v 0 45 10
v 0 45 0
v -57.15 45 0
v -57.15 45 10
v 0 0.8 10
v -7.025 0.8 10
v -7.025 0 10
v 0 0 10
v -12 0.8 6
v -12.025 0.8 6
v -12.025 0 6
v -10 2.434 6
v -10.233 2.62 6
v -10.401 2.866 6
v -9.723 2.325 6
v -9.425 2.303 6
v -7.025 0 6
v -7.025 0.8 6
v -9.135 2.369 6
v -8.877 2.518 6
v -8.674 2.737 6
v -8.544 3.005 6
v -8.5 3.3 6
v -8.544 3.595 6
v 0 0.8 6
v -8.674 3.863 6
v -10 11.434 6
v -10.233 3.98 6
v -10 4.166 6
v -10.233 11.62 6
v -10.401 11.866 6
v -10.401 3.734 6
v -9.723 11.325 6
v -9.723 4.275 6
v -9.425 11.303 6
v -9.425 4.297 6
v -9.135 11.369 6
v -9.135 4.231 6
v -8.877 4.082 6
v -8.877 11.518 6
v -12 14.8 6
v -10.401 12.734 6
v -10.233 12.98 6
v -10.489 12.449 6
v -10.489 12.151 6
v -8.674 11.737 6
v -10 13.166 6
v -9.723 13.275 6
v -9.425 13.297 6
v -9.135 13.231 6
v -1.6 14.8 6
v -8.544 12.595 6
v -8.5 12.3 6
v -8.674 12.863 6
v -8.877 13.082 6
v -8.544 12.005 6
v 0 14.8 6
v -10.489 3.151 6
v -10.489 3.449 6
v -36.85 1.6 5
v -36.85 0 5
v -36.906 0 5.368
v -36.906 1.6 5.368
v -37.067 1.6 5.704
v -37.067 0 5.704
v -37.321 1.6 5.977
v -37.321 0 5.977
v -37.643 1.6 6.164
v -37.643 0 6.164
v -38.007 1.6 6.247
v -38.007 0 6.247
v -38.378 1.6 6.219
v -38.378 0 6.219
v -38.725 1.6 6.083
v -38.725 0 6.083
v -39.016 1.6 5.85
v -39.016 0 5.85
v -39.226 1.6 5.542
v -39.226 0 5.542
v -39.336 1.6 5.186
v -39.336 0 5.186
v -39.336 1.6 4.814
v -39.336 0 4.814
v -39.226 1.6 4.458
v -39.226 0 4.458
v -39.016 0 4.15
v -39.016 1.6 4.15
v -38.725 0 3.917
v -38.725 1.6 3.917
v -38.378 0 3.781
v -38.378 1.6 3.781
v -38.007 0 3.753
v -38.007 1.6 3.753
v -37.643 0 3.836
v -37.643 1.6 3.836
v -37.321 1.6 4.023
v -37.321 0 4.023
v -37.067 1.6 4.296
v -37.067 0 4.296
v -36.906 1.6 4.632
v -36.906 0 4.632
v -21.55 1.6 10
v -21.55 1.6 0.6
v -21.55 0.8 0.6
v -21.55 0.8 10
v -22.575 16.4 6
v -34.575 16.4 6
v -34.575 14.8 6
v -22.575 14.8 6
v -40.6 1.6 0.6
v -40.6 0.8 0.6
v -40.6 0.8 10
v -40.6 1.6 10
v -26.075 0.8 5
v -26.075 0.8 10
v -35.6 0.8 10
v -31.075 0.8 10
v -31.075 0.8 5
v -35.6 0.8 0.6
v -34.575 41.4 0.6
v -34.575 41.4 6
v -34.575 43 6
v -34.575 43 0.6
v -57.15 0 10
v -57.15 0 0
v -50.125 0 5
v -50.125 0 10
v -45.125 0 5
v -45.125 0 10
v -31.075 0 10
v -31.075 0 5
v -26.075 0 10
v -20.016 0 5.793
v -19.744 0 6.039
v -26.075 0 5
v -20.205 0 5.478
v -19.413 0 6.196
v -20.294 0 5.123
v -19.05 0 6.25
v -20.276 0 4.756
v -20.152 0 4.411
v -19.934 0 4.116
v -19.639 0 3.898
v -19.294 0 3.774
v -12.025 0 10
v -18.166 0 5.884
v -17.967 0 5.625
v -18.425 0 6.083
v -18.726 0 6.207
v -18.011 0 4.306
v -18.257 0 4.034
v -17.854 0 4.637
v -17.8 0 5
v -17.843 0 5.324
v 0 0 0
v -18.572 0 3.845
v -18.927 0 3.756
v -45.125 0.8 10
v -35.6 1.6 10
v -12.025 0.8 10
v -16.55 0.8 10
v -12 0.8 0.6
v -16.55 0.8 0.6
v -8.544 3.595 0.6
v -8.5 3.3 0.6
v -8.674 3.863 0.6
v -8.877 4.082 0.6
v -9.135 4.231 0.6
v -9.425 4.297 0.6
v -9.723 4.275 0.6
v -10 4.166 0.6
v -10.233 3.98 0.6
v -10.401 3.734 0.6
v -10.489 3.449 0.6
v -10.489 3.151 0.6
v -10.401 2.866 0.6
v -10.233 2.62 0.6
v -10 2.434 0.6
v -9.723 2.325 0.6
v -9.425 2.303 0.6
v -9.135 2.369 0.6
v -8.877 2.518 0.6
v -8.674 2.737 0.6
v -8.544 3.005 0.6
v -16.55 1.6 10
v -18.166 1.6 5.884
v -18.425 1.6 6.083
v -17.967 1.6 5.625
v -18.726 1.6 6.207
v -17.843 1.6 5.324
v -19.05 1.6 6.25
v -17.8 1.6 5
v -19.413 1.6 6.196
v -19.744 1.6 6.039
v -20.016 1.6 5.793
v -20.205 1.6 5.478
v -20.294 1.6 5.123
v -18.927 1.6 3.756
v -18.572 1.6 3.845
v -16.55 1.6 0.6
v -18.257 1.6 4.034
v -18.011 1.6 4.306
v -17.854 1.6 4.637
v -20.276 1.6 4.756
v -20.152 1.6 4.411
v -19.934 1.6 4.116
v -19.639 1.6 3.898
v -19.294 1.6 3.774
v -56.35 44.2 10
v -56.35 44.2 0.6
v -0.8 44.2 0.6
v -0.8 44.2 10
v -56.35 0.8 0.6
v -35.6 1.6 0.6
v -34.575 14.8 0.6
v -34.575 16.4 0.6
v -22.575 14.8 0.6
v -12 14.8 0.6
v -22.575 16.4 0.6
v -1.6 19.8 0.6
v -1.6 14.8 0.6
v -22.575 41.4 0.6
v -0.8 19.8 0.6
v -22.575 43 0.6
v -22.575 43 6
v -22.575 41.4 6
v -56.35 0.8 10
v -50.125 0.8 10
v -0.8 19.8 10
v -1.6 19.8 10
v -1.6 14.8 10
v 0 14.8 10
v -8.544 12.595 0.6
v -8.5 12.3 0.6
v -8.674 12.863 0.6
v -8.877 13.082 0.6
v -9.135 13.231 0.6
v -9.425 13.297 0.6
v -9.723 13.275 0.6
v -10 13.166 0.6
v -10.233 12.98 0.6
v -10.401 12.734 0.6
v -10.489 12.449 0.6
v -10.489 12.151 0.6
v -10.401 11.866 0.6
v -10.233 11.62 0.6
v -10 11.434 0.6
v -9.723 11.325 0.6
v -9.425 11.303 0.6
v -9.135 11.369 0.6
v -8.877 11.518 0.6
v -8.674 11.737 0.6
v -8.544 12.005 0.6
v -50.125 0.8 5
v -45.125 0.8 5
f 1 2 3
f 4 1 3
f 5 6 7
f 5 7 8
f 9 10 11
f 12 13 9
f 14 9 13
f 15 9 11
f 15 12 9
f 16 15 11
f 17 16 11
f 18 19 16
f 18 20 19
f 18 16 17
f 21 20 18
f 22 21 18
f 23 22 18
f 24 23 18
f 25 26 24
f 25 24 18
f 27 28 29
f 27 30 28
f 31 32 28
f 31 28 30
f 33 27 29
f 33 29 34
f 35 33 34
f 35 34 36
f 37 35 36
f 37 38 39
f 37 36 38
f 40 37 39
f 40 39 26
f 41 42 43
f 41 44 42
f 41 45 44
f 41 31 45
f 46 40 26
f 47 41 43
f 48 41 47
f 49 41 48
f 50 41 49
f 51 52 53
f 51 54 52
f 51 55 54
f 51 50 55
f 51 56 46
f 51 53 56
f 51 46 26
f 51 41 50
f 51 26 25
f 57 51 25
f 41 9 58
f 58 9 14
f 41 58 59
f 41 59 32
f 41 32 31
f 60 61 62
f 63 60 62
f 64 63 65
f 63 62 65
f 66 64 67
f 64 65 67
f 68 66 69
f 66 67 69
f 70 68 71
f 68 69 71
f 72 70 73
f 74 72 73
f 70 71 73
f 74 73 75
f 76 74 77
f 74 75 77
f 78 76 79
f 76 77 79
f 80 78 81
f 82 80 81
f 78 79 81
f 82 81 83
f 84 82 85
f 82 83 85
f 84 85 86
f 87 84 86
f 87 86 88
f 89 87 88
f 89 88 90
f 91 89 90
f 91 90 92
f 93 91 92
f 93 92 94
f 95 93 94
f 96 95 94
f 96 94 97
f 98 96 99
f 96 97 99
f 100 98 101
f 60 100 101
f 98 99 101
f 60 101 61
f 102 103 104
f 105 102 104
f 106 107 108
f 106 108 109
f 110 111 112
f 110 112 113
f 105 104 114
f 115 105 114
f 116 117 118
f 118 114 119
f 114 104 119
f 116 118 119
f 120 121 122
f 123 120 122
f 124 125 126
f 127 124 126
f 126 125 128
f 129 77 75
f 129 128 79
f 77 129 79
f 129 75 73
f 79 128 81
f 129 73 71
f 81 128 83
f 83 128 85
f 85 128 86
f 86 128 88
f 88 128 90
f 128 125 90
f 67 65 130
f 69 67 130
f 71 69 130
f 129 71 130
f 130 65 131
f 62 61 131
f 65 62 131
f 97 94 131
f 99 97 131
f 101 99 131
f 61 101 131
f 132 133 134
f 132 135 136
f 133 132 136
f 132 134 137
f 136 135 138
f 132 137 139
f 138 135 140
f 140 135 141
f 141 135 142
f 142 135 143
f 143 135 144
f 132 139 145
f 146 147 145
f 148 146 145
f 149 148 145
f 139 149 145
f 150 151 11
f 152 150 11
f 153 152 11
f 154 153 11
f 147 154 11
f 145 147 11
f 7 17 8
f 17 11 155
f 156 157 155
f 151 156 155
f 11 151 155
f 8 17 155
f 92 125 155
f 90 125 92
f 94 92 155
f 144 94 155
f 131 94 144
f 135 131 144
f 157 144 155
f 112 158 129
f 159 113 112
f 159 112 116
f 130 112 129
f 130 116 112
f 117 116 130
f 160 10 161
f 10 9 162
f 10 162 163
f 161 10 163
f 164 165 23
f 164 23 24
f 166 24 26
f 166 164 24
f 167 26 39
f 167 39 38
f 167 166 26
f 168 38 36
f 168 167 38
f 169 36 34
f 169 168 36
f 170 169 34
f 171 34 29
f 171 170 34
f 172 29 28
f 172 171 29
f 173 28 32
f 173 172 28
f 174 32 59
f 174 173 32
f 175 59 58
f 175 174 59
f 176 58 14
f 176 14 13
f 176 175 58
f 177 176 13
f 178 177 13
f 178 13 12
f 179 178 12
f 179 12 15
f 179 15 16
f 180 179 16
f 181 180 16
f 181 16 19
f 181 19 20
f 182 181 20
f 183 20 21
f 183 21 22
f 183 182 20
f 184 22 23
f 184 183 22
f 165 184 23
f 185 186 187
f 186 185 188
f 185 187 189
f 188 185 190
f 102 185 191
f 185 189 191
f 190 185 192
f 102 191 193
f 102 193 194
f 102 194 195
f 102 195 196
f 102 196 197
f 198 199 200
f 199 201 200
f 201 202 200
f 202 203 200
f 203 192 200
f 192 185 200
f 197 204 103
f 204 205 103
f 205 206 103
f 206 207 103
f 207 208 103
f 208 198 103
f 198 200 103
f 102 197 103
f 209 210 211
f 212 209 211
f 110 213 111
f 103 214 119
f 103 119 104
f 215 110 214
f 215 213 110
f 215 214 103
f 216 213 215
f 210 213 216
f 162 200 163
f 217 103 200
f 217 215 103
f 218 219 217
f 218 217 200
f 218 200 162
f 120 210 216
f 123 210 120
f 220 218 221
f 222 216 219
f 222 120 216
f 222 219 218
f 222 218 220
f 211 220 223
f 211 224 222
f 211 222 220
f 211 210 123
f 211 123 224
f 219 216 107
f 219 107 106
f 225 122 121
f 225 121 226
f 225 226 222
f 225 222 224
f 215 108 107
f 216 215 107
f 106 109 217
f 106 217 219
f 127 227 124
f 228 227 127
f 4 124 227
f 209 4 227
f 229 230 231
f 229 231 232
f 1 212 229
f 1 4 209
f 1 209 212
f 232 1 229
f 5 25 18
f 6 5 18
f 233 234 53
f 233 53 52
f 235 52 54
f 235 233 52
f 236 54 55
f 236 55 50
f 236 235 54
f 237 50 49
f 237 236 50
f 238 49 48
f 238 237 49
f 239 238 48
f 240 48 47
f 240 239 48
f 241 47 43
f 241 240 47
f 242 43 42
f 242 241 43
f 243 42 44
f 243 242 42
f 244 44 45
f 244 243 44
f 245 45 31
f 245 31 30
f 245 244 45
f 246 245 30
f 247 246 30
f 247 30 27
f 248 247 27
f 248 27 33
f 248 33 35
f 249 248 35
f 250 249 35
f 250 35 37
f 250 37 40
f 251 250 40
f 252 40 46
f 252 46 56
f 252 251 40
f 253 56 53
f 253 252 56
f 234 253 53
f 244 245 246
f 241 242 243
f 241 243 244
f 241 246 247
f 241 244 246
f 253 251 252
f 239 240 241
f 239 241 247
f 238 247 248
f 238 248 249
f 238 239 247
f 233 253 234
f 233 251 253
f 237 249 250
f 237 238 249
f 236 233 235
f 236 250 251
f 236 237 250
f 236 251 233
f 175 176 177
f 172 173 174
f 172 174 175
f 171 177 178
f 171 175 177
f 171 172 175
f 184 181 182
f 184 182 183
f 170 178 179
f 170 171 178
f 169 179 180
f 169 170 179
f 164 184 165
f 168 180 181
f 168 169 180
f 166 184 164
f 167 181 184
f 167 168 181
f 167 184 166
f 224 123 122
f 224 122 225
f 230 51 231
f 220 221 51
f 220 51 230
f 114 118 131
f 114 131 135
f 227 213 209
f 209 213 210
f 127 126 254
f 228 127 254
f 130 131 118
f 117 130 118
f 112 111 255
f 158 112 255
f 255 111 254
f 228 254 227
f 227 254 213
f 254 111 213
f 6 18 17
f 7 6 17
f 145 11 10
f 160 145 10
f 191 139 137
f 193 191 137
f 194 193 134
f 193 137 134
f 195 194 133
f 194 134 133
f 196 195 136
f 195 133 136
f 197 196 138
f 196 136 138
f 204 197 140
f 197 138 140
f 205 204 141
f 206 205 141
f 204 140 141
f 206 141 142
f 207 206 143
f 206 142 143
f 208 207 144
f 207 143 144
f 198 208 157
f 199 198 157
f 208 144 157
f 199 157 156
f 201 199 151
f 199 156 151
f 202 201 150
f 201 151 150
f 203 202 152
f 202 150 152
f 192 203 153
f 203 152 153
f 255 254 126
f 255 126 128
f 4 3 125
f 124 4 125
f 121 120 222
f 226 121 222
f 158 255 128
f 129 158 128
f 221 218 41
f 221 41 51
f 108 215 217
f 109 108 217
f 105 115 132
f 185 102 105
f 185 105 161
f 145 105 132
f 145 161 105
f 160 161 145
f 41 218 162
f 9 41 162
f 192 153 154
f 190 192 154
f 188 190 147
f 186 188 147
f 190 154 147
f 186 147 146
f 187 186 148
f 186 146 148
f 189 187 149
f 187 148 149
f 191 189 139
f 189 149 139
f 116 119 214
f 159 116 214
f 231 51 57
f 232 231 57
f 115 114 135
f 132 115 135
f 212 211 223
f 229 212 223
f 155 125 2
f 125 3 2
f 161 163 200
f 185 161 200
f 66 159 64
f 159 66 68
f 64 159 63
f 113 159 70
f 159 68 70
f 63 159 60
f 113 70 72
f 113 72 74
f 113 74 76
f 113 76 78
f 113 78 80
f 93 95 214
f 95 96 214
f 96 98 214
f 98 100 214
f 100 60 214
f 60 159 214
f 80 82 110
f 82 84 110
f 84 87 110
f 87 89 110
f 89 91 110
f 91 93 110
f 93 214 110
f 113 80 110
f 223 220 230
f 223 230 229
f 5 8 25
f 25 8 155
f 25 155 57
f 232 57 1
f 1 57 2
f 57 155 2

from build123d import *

# Parameters (mm, degrees)
F0_W     = 12
F0_H     = 1.6
F0_H_2   = 7
F0_R     = 1
F1_DEPTH = 0.6
F2_W     = 12
F2_H     = 1.6
F2_H_2   = 7
F2_R     = 1
F3_DEPTH = 5.4
F4_W     = 2.5
F4_H     = 0.8
F4_W_2   = 0.8
F4_H_2   = 5
F5_DEPTH = 9.4
F6_DEPTH = 4.4
F7_DEPTH = 1
F8_R     = 1.25
F9_DEPTH = 1.6


# Not quite as in the source:
# - a feature names something its author has since deleted; it is built from what else it names


with BuildPart() as f1:
    # F0 (on Top) → F1 (new body)
    with BuildSketch(Plane.XY):
        Polygon((-57.15, 0), (-12, 0), (-12, 7), (-12, 14), (0, 14), (0, 43), (-22.575, 43), (-22.575, 41.4), (-34.575, 41.4), (-34.575, 43), (-57.15, 43), align=None)
        with Locations((-28.575, 15.6)):
            Rectangle(F0_W, F0_H, mode=Mode.SUBTRACT)
        Polygon((-57.15, 45), (-57.15, 43), (-34.575, 43), (-22.575, 43), (0, 43), (0, 45), align=None)
        with Locations((-6, 10.5)):
            Rectangle(F0_W, F0_H_2)
        with Locations((-9.5, 11.5)):
            Circle(F0_R, mode=Mode.SUBTRACT)
        with Locations((-6, 3.5)):
            Rectangle(F0_W, F0_H_2)
        with Locations((-9.5, 2.5)):
            Circle(F0_R, mode=Mode.SUBTRACT)
        with Locations((-28.575, 42.2)):
            Rectangle(F0_W, F0_H)
        with Locations((-28.575, 15.6)):
            Rectangle(F0_W, F0_H)
        with Locations((-9.5, 11.5)):
            Circle(F0_R)
        with Locations((-9.5, 2.5)):
            Circle(F0_R)
    extrude(amount=F1_DEPTH)

    # F2 (on face) → F3 (join)
    with BuildSketch(Plane.XY.offset(0.6)):
        with Locations((-28.575, 42.2)):
            Rectangle(F2_W, F2_H)
        with Locations((-28.575, 15.6)):
            Rectangle(F2_W, F2_H)
        with Locations((-6, 11.3)):
            Rectangle(F2_W, F2_H_2)
        with Locations((-9.5, 12.3)):
            Circle(F2_R, mode=Mode.SUBTRACT)
        with Locations((-6, 4.3)):
            Rectangle(F2_W, F2_H_2)
        with Locations((-9.5, 3.3)):
            Circle(F2_R, mode=Mode.SUBTRACT)
    extrude(amount=F3_DEPTH)

    # F4 (on face) → F5 (join)
    with BuildSketch(Plane.XY.offset(0.6)):
        Polygon((-45.125, 0.8), (-45.125, 0), (-31.075, 0), (-31.075, 0.8), (-35.6, 0.8), (-38.1, 0.8), (-40.6, 0.8), align=None)
        with Locations((-36.85, 1.2)):
            Rectangle(F4_W, F4_H)
        with Locations((-39.35, 1.2)):
            Rectangle(F4_W, F4_H)
        Polygon((-21.55, 1.6), (-21.55, 0.8), (-16.55, 0.8), (-16.55, 1.6), (-19.05, 1.6), align=None)
        Polygon((-26.075, 0.8), (-26.075, 0), (-12.025, 0), (-12.025, 0.8), (-16.55, 0.8), (-21.55, 0.8), align=None)
        Polygon((0, 0), (0, 0.8), (-0.8, 0.8), (-7.025, 0.8), (-7.025, 0), align=None)
        Polygon((0, 45), (-57.15, 45), (-57.15, 0), (-50.125, 0), (-50.125, 0.8), (-56.35, 0.8), (-56.35, 44.2), (-0.8, 44.2), (-0.8, 19.8), (-0.8, 14.8), (0, 14.8), align=None)
        with Locations((-1.2, 17.3)):
            Rectangle(F4_W_2, F4_H_2)
    extrude(amount=F5_DEPTH)

    # F4 (on face) → F6 (join)
    with BuildSketch(Plane.XY.offset(0.6)):
        Polygon((-31.075, 0.8), (-31.075, 0), (-26.075, 0), (-26.075, 0.8), (-28.575, 0.8), align=None)
        Polygon((-50.125, 0.8), (-50.125, 0), (-45.125, 0), (-45.125, 0.8), (-47.625, 0.8), align=None)
        Polygon((-12.025, 0), (-7.025, 0), (-7.025, 0.8), (-9.525, 0.8), (-12, 0.8), (-12.025, 0.8), align=None)
    extrude(amount=F6_DEPTH)

    # F7 (add): a face of the model
    f7_faces = [f1.faces().sort_by_distance(p)[0] for p in [
        (-9.525, 0.4, 5),
    ]]
    extrude(f7_faces, amount=F7_DEPTH)

    # F8 (on face) → F9 (cut)
    with BuildSketch(Plane.XZ):
        with Locations((-38.1, 5)):
            Circle(F8_R)
        with BuildLine():
            ThreePointArc((-17.8, 5), (-18.1661165235, 5.8838834765), (-19.05, 6.25))
            ThreePointArc((-19.05, 6.25), (-19.9338834765, 4.1161165235), (-17.8, 5))
        make_face()
    extrude(amount=-F9_DEPTH, mode=Mode.SUBTRACT)


solid = f1.part
